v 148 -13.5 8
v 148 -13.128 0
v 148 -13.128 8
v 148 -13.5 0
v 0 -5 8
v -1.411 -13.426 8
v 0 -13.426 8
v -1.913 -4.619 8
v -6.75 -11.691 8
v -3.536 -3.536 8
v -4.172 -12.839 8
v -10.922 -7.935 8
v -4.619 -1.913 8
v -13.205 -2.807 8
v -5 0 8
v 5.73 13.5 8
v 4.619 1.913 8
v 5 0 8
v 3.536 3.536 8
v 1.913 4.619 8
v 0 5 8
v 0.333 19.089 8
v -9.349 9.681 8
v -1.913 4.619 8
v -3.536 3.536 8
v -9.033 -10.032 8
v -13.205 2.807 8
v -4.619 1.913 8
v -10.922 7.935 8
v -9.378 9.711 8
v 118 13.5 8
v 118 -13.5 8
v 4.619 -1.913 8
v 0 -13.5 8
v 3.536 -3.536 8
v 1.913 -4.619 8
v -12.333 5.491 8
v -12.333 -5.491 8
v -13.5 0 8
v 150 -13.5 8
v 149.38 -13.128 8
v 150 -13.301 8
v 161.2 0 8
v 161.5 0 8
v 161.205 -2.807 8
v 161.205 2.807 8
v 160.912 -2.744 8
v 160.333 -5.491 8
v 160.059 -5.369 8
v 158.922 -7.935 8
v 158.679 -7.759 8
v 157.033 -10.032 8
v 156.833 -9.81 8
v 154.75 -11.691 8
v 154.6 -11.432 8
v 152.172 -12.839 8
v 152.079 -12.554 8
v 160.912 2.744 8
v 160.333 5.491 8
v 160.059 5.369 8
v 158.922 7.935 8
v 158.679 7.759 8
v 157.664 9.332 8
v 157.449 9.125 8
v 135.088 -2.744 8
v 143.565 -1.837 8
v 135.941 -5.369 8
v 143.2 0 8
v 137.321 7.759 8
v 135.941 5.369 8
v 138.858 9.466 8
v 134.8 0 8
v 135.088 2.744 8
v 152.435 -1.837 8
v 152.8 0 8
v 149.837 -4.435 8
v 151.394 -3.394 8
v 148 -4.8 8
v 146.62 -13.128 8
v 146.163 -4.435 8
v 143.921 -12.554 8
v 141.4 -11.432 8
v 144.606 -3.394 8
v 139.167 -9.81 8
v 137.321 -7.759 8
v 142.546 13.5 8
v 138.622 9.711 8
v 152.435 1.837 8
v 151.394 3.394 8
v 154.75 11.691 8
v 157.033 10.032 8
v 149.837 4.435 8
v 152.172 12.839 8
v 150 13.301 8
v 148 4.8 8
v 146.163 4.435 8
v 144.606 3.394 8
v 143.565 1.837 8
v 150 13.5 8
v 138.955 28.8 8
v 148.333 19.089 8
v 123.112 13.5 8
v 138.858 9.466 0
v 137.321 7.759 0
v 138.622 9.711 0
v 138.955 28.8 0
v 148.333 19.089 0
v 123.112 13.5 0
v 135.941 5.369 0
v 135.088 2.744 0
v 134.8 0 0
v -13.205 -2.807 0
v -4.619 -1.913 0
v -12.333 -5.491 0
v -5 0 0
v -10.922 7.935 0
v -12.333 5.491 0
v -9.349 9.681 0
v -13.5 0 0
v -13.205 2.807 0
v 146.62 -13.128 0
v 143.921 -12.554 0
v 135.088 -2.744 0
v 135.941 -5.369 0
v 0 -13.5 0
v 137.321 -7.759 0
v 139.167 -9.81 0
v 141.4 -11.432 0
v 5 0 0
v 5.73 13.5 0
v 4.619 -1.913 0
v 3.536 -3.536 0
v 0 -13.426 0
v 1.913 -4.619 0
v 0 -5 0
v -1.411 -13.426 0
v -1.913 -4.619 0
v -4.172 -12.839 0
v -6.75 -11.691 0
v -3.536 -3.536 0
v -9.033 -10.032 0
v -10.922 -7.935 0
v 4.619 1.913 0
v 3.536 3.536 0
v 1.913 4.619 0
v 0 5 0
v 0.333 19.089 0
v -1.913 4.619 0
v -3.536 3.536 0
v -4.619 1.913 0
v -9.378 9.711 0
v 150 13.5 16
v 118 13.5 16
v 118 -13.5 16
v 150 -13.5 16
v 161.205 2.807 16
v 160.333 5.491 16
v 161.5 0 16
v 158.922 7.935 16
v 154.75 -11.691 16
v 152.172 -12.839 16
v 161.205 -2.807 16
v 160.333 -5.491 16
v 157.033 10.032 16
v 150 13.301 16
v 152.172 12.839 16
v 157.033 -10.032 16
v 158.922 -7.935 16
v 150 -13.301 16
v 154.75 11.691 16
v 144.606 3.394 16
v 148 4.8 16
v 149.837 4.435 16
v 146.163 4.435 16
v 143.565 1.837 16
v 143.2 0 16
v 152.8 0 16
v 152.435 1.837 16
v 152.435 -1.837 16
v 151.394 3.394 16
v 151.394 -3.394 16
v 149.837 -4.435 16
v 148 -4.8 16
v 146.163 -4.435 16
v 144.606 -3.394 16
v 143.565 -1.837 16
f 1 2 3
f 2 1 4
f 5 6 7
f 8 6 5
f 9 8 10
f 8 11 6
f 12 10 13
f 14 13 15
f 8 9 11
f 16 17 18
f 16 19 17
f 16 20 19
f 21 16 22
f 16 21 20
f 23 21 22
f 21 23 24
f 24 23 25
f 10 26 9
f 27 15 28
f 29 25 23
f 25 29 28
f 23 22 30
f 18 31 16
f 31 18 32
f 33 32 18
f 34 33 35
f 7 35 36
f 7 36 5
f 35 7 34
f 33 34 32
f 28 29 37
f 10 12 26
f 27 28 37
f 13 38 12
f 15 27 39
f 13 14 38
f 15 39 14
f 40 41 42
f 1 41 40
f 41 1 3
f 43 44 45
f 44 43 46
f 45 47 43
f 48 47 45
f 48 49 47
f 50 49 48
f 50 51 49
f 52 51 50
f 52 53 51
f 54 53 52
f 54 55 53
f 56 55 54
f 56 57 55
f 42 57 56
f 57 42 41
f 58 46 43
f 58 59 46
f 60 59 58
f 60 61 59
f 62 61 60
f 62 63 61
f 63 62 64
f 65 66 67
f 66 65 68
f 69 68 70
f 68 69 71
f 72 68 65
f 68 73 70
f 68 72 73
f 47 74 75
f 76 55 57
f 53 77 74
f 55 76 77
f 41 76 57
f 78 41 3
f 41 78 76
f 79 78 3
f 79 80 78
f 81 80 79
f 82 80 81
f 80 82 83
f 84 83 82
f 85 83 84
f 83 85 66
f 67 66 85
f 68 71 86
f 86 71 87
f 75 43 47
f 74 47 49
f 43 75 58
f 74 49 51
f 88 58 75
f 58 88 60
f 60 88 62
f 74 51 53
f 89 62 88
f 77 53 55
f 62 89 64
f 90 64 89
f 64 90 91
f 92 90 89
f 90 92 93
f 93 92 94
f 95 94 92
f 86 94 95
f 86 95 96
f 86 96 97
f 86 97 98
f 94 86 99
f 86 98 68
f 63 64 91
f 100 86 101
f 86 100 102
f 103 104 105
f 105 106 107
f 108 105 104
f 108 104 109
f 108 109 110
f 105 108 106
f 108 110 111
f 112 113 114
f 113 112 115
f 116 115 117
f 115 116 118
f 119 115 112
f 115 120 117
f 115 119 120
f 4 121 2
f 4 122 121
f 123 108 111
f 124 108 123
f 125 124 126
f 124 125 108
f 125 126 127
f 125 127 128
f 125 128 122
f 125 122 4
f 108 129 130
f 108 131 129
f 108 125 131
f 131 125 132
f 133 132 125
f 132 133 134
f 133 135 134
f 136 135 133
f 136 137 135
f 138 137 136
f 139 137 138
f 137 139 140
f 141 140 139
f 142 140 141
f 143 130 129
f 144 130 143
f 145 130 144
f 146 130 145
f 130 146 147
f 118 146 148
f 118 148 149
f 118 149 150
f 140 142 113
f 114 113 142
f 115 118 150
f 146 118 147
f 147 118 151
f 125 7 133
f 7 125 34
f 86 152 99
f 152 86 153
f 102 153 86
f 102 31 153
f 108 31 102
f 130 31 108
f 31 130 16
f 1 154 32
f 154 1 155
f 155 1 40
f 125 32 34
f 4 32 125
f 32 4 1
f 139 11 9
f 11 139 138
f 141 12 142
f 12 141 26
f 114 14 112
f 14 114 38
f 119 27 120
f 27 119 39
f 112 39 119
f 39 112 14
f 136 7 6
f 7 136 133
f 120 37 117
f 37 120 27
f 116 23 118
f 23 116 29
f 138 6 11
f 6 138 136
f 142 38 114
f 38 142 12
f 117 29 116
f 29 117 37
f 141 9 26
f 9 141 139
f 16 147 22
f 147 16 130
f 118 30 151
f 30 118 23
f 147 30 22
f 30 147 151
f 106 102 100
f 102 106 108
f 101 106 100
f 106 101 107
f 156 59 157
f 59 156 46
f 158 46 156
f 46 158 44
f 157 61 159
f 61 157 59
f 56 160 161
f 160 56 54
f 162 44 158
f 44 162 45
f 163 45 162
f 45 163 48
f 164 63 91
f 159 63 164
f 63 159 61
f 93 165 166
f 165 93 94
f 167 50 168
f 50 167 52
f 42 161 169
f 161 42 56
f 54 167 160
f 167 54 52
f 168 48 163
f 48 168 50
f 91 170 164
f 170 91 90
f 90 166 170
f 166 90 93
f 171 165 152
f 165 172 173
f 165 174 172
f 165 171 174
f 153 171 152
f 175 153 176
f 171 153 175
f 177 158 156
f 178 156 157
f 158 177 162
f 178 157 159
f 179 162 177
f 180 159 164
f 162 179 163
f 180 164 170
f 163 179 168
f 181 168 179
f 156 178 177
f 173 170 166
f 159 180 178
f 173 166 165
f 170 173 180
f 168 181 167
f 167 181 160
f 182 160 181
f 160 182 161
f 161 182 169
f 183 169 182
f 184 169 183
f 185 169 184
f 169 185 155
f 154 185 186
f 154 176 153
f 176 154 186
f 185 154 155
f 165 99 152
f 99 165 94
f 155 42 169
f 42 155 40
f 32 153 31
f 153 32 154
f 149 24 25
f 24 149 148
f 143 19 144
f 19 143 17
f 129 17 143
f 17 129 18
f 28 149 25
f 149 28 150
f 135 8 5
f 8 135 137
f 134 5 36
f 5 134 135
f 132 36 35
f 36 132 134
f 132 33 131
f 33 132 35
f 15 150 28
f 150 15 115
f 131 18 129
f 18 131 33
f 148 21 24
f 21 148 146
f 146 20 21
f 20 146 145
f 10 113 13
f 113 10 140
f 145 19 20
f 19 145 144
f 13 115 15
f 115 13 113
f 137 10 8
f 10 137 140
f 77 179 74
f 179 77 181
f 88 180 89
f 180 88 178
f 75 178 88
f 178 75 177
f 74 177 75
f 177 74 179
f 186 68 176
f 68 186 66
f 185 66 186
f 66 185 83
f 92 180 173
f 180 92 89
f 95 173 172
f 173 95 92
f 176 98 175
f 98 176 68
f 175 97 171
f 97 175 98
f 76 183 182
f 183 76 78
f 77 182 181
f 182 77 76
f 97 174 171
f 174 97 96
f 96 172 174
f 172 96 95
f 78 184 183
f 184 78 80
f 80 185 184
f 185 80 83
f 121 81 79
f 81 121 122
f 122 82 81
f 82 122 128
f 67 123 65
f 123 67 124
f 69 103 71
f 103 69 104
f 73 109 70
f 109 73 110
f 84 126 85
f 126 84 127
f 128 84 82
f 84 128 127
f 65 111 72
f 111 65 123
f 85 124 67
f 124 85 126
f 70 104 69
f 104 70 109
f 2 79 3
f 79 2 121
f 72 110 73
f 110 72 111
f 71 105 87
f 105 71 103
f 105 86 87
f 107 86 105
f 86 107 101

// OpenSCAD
//My 16mm projector, an Ampro Imperial, could only accommodate 7 inch (400 foot) reels,
//but I had several larger ones. This arm extender, fitting between the projector and the 
//original arm, allows me to use 12" and larger reels on my projector.
//I drive the reel (only necessary when rewinding by combining two spring belts to create
//a larger one; the length of this belt dictates the length of the extender arm.
//I haven't changed the length of the takeup arm; I plan on cutting and resplicing the film,
//so that a larger reel will be stored on two separate 7" takeup reels

hole_diameter= 10;
hole_radius=hole_diameter/2;
arm_width=8;
arm_length=148; //hole to hole
outside_radius=8.5+hole_radius;

difference(){
union(){
translate([0,-outside_radius,0]) cube ([arm_length, outside_radius*2, arm_width]); //main arm
cylinder(h=arm_width, r=outside_radius);    //outside arm bottom
rotate([0,0,44]) cube([outside_radius,outside_radius, arm_width]); //arm stop
translate([arm_length,0,0])
    rotate([0,0,44]) 
    translate([-outside_radius,outside_radius,0])
    cube([outside_radius*2,outside_radius, arm_width]);
translate([arm_length,0,arm_width]) cylinder(h=arm_width, r=outside_radius);    //outside arm bottom
    
translate([arm_length-30,-outside_radius,arm_width]) cube([32, outside_radius*2, arm_width]);

}

cylinder(r=hole_radius, h=arm_width);
translate([arm_length,0,arm_width]) cylinder(r=hole_radius-.2, h=arm_width);
translate([arm_length,0,0]) cylinder(r=outside_radius-.3, h=arm_width);
translate([arm_length,0,0])
    rotate([0,0,44]) 
    cube([outside_radius*2,outside_radius, arm_width]);


}
